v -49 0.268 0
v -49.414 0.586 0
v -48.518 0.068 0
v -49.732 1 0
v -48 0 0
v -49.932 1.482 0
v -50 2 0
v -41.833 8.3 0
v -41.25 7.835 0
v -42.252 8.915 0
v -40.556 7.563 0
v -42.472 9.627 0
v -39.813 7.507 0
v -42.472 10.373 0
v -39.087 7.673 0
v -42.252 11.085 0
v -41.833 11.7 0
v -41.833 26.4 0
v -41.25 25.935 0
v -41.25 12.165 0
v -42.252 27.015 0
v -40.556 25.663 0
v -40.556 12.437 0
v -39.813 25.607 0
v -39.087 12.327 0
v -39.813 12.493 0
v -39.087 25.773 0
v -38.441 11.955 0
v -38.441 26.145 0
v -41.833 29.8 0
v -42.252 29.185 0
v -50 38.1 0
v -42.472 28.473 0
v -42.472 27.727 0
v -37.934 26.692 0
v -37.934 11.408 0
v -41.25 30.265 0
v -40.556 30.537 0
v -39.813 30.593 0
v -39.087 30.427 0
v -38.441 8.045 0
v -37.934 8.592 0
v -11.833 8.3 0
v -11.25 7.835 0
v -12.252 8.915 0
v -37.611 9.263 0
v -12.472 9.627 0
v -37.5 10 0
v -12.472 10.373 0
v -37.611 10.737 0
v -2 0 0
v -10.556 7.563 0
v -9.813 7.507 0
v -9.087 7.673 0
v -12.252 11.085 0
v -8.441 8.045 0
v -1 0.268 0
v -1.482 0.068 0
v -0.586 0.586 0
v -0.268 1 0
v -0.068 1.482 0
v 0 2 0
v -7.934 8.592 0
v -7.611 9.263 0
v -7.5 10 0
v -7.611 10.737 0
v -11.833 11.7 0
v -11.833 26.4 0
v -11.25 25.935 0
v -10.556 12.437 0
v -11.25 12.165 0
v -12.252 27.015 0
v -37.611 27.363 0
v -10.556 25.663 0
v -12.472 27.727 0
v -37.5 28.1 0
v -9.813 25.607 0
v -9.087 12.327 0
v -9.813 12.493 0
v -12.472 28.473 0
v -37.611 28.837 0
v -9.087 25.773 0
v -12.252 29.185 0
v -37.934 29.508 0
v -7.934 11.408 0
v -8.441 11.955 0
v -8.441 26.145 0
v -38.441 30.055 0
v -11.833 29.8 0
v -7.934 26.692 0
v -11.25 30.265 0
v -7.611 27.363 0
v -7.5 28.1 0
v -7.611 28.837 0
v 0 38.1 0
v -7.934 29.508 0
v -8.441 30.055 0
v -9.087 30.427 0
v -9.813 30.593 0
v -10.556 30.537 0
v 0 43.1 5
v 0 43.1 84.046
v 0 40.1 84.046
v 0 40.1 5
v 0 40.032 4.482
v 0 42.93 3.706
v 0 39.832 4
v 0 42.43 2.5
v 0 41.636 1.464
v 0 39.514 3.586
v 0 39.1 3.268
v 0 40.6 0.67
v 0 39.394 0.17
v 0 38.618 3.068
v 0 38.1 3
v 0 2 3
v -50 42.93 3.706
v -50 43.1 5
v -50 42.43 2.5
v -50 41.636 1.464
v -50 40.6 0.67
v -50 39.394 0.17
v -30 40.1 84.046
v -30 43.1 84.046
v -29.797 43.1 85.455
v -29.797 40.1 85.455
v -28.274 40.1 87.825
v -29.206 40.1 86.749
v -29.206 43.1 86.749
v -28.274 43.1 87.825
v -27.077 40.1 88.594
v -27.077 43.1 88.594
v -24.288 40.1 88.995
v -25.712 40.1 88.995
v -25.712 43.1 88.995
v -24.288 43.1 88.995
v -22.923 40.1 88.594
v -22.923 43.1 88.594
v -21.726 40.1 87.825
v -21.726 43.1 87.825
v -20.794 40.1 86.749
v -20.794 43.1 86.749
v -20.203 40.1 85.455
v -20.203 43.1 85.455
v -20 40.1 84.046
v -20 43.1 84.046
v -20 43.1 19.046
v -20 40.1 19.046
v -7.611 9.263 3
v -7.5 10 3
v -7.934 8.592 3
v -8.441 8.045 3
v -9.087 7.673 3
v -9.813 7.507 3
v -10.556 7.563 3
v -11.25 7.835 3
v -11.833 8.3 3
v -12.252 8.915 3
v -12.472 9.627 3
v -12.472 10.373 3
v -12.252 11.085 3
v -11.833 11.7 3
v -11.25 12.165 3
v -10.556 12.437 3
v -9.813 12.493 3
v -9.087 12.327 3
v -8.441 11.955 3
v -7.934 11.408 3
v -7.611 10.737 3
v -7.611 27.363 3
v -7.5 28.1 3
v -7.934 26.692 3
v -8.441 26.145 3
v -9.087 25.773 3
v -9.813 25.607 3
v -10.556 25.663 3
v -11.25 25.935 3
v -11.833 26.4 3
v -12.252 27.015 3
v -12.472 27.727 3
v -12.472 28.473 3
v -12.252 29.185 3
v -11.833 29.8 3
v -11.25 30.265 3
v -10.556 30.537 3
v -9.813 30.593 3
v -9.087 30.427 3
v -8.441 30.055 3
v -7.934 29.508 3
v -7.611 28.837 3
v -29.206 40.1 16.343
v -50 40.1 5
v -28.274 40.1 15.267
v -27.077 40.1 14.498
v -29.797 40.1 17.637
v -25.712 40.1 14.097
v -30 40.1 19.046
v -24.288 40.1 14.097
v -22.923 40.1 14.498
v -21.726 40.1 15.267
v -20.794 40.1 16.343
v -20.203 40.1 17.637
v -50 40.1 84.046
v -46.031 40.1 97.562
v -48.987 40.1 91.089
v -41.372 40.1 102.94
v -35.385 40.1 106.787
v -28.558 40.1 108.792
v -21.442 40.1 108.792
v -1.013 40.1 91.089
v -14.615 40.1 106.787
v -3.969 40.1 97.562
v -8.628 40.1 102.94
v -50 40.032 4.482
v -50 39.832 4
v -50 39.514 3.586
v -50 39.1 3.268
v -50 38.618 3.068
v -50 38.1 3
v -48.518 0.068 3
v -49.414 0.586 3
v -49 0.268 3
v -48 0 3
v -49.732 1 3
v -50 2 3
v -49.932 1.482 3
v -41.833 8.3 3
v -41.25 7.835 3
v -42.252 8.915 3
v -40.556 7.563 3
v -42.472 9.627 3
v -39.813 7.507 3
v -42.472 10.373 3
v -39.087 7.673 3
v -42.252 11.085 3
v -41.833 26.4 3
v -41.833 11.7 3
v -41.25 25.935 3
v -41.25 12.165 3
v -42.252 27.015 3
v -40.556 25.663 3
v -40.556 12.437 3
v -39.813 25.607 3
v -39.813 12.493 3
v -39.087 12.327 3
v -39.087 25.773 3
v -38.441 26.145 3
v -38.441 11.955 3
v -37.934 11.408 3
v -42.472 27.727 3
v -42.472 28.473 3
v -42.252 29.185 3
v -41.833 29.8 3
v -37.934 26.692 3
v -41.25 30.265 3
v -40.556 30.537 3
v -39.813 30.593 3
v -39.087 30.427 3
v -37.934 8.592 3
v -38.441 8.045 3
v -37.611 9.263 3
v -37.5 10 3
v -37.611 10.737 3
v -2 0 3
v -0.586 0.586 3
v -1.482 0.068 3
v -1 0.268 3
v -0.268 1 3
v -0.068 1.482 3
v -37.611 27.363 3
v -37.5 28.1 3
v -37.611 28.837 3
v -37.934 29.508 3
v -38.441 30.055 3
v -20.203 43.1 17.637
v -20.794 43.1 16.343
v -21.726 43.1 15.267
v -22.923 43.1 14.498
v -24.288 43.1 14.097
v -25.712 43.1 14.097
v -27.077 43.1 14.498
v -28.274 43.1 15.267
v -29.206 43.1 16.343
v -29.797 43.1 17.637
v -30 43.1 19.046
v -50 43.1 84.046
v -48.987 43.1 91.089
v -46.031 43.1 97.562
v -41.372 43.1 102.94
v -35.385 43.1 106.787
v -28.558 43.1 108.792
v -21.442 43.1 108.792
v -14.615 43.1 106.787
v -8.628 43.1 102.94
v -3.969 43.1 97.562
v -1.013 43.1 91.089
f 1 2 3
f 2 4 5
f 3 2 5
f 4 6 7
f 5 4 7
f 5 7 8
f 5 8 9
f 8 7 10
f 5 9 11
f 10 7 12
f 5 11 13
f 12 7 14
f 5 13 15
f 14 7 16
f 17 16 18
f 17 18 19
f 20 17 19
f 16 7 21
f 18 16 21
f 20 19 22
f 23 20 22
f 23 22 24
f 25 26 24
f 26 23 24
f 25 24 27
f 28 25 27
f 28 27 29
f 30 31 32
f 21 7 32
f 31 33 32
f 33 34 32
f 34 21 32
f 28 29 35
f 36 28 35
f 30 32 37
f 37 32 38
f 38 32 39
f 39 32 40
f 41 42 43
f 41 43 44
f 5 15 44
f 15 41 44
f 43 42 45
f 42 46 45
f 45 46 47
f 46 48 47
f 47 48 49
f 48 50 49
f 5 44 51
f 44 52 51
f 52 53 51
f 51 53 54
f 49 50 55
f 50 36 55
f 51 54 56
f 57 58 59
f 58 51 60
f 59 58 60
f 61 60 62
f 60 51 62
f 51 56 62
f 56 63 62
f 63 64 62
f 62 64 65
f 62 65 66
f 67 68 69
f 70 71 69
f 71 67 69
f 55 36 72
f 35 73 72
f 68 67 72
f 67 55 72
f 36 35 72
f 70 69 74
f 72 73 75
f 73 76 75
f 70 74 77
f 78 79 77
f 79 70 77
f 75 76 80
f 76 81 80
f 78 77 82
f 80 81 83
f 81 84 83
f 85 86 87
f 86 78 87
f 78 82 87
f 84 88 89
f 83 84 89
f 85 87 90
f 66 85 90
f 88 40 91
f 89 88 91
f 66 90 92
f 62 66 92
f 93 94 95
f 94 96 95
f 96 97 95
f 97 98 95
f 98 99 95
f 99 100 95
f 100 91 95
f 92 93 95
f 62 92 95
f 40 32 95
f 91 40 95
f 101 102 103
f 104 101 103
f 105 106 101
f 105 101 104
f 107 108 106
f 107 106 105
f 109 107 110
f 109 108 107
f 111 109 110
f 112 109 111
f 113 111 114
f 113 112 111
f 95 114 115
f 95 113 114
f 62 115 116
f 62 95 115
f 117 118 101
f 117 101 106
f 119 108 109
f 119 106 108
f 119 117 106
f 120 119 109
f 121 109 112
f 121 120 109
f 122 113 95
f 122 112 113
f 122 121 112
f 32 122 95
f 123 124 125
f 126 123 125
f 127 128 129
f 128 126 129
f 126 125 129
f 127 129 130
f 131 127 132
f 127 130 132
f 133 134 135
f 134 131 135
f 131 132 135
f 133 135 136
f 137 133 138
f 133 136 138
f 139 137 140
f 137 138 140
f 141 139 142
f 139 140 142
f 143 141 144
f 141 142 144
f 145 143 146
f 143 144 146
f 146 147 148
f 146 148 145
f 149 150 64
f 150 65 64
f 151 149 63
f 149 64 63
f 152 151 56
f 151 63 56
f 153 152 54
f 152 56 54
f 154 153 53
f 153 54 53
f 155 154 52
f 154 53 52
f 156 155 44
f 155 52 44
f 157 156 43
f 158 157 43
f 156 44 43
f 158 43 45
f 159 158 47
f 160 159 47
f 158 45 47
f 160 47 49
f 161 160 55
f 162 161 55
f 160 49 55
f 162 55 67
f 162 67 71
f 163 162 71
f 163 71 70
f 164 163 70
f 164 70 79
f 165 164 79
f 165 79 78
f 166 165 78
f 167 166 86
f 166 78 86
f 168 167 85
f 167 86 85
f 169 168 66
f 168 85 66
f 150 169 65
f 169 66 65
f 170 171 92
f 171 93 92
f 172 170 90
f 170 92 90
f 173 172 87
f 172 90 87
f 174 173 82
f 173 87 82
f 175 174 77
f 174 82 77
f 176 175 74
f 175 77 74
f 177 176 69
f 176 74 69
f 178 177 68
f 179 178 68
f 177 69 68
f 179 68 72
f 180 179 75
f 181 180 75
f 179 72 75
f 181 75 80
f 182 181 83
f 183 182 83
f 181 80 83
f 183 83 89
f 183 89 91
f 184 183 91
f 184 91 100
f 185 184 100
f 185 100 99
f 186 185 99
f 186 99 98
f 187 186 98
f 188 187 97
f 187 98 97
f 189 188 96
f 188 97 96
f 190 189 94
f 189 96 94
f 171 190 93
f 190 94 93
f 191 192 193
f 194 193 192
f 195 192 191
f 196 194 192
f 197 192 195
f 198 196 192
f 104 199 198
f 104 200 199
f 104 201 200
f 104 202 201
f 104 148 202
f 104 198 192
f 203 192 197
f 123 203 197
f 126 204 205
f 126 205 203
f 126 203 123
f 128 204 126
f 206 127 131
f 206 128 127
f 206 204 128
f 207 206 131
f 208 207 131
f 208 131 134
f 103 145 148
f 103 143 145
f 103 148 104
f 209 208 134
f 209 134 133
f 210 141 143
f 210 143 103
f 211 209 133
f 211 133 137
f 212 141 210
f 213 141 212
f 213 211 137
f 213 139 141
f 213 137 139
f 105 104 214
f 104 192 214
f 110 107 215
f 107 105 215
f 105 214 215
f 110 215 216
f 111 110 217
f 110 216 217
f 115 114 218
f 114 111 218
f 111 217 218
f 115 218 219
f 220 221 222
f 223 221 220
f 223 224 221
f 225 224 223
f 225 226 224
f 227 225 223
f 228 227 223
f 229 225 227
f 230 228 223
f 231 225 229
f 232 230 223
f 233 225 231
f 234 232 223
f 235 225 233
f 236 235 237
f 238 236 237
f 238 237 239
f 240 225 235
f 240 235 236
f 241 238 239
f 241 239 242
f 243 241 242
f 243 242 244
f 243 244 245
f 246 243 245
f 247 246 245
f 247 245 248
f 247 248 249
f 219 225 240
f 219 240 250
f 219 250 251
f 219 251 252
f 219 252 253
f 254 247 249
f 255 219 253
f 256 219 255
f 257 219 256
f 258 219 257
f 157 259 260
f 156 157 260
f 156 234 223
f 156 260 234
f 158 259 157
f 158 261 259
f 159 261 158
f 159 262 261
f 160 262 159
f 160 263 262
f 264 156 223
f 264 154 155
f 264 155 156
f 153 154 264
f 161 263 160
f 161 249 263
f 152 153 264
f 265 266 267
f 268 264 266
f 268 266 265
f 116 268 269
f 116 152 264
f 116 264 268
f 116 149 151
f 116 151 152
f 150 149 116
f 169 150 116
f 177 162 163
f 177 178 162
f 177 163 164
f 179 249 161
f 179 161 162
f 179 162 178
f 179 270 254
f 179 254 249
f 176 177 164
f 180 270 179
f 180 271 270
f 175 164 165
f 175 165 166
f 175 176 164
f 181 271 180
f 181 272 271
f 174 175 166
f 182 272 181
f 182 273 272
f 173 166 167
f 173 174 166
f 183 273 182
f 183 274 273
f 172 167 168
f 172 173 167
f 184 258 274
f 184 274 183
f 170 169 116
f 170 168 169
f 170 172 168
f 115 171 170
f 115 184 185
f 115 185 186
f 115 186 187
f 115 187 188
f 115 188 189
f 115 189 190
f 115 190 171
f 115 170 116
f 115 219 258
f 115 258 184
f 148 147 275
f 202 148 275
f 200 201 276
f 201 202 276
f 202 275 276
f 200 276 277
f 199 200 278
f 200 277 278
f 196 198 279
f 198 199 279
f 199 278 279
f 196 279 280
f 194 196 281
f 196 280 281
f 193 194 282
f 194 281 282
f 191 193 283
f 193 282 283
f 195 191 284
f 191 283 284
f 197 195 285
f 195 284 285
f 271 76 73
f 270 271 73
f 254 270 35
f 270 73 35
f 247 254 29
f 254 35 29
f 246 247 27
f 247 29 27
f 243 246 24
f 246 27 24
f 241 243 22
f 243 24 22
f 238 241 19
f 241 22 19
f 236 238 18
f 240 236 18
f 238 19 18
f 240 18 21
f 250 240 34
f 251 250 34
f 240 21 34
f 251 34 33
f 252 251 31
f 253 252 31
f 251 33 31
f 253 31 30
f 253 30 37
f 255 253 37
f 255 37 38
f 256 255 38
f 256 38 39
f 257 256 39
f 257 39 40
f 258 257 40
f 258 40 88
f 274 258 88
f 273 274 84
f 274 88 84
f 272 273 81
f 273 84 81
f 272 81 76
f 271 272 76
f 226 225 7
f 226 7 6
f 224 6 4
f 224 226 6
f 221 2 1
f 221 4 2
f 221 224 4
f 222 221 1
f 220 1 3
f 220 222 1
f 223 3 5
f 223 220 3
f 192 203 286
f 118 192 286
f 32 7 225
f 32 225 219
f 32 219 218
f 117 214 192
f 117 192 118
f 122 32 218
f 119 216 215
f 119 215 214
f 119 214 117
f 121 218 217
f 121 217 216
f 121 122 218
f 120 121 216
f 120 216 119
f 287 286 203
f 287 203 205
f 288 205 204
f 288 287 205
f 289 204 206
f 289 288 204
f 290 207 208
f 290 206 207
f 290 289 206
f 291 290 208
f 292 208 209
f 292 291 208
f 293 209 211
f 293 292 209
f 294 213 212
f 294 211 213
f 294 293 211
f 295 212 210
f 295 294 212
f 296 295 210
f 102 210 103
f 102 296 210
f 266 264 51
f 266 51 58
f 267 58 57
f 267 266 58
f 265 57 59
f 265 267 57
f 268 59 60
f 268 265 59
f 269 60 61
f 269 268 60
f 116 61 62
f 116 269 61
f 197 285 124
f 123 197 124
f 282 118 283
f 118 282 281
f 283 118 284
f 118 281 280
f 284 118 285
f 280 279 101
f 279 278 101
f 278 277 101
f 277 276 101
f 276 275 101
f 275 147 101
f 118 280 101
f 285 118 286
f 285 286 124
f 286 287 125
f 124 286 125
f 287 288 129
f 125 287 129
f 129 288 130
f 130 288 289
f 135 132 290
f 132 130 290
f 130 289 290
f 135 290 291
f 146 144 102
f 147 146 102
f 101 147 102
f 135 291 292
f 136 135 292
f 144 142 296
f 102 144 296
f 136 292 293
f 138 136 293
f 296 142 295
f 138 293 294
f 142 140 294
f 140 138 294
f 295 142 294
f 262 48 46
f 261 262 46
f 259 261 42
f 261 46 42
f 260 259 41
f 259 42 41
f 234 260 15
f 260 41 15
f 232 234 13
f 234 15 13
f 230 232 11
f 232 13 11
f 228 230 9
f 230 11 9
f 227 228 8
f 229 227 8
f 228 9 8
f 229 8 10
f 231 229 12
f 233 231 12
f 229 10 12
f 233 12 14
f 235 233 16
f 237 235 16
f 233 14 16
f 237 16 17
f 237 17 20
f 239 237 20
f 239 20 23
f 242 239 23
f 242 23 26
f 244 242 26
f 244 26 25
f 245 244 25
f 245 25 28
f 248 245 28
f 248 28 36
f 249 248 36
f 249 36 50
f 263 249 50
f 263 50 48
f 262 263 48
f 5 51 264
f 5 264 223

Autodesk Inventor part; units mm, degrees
ref_plane "YZ Plane" through (0, 0, 0) normal (1, 0, 0) x (0, 1, 0)
ref_plane "XZ Plane" through (0, 0, 0) normal (0, 1, 0) x (-1, 0, 0)
ref_plane "XY Plane" through (0, 0, 0) normal (0, 0, 1) x (1, 0, 0)
sketch "Boceto1" plane through (0, 0, 0) normal (0, 0, 1) x (1, 0, 0)
  line L0 (0, 0) -> (-50, 0)
  line L1 (-50, 0) -> (-50, 125)
  line L2 (0, 125) -> (0, 0)
  arc A0 (0, 125) -> (-50, 125) centre (-25, 125) ccw
  arc A1 (-20, 125) -> (-30, 125) centre (-25, 125) ccw
  line L3 (-25, 67.5) -> (-25, 60)
  arc A2 (-30, 60) -> (-20, 60) centre (-25, 60) ccw
  line L4 (-30, 60) -> (-30, 125)
  line L5 (-20, 60) -> (-20, 125)
  line L6 (0, 0) -> (-50, 0)
  line L7 (-50, 0) -> (-50, 38.1)
  line L8 (-50, 38.1) -> (0, 38.1)
  line L9 (0, 38.1) -> (0, 0)
  line L10 (-10, 28.1) -> (-40, 28.1)
  line L11 (-40, 28.1) -> (-40, 10)
  line L12 (-40, 10) -> (-10, 10)
  line L13 (-10, 10) -> (-10, 28.1)
  circle A3 centre (-40, 28.1) radius 2.5
  circle A4 centre (-10, 28.1) radius 2.5
  circle A5 centre (-40, 10) radius 2.5
  circle A6 centre (-10, 10) radius 2.5
  point P0 (-12.5, 10)
  point P1 (-10, 12.5)
  point P2 (-10, 25.6)
  point P3 (-12.5, 28.1)
  point P4 (-37.5, 28.1)
  point P5 (-40, 25.6)
  point P6 (-40, 12.5)
  point P7 (-37.5, 10)
  dimension "d2" = 10
  dimension "d3" = 65
  dimension "d4" = 10
  dimension "d5" = 38.1
  dimension "d6" = 10
  dimension "d7" = 5
  dimension "d8" = 5
  dimension "d9" = 5
  dimension "d10" = 5
extrude "Extrusión1" add sketch "Boceto1" along normal blind 3 contours L0 L1 L8 L2 | L8 L1 A0 L2 | L5 A2 L4 A1 | A3 L11 L10 | L10 L11 A3 | L10 A4 L13 A6 L12 A5 L11 A3 | A4 L13 L10 | L10 L13 A4 | A5 L12 L11 | L11 L12 A5 | A6 L12 L13 | L13 L12 A6
fillet "Empalme1" radius 2 2 edges at (0, 0, 1.5) (-50, 0, 1.5)
extrude "Extrusión2" cut sketch "Boceto1" along normal blind 3 contours L5 A2 L4 A1 | A3 L11 L10 | L10 L11 A3 | A4 L13 L10 | L10 L13 A4 | A5 L12 L11 | L11 L12 A5 | A6 L12 L13 | L13 L12 A6
bend part "Pieza de plegado1" radius 5 angle 90 line through (-50, 38.1, 0) along (1, 0, 0) centre toward (0, 0, 1) moving side (0, 1, 0) both sides no
